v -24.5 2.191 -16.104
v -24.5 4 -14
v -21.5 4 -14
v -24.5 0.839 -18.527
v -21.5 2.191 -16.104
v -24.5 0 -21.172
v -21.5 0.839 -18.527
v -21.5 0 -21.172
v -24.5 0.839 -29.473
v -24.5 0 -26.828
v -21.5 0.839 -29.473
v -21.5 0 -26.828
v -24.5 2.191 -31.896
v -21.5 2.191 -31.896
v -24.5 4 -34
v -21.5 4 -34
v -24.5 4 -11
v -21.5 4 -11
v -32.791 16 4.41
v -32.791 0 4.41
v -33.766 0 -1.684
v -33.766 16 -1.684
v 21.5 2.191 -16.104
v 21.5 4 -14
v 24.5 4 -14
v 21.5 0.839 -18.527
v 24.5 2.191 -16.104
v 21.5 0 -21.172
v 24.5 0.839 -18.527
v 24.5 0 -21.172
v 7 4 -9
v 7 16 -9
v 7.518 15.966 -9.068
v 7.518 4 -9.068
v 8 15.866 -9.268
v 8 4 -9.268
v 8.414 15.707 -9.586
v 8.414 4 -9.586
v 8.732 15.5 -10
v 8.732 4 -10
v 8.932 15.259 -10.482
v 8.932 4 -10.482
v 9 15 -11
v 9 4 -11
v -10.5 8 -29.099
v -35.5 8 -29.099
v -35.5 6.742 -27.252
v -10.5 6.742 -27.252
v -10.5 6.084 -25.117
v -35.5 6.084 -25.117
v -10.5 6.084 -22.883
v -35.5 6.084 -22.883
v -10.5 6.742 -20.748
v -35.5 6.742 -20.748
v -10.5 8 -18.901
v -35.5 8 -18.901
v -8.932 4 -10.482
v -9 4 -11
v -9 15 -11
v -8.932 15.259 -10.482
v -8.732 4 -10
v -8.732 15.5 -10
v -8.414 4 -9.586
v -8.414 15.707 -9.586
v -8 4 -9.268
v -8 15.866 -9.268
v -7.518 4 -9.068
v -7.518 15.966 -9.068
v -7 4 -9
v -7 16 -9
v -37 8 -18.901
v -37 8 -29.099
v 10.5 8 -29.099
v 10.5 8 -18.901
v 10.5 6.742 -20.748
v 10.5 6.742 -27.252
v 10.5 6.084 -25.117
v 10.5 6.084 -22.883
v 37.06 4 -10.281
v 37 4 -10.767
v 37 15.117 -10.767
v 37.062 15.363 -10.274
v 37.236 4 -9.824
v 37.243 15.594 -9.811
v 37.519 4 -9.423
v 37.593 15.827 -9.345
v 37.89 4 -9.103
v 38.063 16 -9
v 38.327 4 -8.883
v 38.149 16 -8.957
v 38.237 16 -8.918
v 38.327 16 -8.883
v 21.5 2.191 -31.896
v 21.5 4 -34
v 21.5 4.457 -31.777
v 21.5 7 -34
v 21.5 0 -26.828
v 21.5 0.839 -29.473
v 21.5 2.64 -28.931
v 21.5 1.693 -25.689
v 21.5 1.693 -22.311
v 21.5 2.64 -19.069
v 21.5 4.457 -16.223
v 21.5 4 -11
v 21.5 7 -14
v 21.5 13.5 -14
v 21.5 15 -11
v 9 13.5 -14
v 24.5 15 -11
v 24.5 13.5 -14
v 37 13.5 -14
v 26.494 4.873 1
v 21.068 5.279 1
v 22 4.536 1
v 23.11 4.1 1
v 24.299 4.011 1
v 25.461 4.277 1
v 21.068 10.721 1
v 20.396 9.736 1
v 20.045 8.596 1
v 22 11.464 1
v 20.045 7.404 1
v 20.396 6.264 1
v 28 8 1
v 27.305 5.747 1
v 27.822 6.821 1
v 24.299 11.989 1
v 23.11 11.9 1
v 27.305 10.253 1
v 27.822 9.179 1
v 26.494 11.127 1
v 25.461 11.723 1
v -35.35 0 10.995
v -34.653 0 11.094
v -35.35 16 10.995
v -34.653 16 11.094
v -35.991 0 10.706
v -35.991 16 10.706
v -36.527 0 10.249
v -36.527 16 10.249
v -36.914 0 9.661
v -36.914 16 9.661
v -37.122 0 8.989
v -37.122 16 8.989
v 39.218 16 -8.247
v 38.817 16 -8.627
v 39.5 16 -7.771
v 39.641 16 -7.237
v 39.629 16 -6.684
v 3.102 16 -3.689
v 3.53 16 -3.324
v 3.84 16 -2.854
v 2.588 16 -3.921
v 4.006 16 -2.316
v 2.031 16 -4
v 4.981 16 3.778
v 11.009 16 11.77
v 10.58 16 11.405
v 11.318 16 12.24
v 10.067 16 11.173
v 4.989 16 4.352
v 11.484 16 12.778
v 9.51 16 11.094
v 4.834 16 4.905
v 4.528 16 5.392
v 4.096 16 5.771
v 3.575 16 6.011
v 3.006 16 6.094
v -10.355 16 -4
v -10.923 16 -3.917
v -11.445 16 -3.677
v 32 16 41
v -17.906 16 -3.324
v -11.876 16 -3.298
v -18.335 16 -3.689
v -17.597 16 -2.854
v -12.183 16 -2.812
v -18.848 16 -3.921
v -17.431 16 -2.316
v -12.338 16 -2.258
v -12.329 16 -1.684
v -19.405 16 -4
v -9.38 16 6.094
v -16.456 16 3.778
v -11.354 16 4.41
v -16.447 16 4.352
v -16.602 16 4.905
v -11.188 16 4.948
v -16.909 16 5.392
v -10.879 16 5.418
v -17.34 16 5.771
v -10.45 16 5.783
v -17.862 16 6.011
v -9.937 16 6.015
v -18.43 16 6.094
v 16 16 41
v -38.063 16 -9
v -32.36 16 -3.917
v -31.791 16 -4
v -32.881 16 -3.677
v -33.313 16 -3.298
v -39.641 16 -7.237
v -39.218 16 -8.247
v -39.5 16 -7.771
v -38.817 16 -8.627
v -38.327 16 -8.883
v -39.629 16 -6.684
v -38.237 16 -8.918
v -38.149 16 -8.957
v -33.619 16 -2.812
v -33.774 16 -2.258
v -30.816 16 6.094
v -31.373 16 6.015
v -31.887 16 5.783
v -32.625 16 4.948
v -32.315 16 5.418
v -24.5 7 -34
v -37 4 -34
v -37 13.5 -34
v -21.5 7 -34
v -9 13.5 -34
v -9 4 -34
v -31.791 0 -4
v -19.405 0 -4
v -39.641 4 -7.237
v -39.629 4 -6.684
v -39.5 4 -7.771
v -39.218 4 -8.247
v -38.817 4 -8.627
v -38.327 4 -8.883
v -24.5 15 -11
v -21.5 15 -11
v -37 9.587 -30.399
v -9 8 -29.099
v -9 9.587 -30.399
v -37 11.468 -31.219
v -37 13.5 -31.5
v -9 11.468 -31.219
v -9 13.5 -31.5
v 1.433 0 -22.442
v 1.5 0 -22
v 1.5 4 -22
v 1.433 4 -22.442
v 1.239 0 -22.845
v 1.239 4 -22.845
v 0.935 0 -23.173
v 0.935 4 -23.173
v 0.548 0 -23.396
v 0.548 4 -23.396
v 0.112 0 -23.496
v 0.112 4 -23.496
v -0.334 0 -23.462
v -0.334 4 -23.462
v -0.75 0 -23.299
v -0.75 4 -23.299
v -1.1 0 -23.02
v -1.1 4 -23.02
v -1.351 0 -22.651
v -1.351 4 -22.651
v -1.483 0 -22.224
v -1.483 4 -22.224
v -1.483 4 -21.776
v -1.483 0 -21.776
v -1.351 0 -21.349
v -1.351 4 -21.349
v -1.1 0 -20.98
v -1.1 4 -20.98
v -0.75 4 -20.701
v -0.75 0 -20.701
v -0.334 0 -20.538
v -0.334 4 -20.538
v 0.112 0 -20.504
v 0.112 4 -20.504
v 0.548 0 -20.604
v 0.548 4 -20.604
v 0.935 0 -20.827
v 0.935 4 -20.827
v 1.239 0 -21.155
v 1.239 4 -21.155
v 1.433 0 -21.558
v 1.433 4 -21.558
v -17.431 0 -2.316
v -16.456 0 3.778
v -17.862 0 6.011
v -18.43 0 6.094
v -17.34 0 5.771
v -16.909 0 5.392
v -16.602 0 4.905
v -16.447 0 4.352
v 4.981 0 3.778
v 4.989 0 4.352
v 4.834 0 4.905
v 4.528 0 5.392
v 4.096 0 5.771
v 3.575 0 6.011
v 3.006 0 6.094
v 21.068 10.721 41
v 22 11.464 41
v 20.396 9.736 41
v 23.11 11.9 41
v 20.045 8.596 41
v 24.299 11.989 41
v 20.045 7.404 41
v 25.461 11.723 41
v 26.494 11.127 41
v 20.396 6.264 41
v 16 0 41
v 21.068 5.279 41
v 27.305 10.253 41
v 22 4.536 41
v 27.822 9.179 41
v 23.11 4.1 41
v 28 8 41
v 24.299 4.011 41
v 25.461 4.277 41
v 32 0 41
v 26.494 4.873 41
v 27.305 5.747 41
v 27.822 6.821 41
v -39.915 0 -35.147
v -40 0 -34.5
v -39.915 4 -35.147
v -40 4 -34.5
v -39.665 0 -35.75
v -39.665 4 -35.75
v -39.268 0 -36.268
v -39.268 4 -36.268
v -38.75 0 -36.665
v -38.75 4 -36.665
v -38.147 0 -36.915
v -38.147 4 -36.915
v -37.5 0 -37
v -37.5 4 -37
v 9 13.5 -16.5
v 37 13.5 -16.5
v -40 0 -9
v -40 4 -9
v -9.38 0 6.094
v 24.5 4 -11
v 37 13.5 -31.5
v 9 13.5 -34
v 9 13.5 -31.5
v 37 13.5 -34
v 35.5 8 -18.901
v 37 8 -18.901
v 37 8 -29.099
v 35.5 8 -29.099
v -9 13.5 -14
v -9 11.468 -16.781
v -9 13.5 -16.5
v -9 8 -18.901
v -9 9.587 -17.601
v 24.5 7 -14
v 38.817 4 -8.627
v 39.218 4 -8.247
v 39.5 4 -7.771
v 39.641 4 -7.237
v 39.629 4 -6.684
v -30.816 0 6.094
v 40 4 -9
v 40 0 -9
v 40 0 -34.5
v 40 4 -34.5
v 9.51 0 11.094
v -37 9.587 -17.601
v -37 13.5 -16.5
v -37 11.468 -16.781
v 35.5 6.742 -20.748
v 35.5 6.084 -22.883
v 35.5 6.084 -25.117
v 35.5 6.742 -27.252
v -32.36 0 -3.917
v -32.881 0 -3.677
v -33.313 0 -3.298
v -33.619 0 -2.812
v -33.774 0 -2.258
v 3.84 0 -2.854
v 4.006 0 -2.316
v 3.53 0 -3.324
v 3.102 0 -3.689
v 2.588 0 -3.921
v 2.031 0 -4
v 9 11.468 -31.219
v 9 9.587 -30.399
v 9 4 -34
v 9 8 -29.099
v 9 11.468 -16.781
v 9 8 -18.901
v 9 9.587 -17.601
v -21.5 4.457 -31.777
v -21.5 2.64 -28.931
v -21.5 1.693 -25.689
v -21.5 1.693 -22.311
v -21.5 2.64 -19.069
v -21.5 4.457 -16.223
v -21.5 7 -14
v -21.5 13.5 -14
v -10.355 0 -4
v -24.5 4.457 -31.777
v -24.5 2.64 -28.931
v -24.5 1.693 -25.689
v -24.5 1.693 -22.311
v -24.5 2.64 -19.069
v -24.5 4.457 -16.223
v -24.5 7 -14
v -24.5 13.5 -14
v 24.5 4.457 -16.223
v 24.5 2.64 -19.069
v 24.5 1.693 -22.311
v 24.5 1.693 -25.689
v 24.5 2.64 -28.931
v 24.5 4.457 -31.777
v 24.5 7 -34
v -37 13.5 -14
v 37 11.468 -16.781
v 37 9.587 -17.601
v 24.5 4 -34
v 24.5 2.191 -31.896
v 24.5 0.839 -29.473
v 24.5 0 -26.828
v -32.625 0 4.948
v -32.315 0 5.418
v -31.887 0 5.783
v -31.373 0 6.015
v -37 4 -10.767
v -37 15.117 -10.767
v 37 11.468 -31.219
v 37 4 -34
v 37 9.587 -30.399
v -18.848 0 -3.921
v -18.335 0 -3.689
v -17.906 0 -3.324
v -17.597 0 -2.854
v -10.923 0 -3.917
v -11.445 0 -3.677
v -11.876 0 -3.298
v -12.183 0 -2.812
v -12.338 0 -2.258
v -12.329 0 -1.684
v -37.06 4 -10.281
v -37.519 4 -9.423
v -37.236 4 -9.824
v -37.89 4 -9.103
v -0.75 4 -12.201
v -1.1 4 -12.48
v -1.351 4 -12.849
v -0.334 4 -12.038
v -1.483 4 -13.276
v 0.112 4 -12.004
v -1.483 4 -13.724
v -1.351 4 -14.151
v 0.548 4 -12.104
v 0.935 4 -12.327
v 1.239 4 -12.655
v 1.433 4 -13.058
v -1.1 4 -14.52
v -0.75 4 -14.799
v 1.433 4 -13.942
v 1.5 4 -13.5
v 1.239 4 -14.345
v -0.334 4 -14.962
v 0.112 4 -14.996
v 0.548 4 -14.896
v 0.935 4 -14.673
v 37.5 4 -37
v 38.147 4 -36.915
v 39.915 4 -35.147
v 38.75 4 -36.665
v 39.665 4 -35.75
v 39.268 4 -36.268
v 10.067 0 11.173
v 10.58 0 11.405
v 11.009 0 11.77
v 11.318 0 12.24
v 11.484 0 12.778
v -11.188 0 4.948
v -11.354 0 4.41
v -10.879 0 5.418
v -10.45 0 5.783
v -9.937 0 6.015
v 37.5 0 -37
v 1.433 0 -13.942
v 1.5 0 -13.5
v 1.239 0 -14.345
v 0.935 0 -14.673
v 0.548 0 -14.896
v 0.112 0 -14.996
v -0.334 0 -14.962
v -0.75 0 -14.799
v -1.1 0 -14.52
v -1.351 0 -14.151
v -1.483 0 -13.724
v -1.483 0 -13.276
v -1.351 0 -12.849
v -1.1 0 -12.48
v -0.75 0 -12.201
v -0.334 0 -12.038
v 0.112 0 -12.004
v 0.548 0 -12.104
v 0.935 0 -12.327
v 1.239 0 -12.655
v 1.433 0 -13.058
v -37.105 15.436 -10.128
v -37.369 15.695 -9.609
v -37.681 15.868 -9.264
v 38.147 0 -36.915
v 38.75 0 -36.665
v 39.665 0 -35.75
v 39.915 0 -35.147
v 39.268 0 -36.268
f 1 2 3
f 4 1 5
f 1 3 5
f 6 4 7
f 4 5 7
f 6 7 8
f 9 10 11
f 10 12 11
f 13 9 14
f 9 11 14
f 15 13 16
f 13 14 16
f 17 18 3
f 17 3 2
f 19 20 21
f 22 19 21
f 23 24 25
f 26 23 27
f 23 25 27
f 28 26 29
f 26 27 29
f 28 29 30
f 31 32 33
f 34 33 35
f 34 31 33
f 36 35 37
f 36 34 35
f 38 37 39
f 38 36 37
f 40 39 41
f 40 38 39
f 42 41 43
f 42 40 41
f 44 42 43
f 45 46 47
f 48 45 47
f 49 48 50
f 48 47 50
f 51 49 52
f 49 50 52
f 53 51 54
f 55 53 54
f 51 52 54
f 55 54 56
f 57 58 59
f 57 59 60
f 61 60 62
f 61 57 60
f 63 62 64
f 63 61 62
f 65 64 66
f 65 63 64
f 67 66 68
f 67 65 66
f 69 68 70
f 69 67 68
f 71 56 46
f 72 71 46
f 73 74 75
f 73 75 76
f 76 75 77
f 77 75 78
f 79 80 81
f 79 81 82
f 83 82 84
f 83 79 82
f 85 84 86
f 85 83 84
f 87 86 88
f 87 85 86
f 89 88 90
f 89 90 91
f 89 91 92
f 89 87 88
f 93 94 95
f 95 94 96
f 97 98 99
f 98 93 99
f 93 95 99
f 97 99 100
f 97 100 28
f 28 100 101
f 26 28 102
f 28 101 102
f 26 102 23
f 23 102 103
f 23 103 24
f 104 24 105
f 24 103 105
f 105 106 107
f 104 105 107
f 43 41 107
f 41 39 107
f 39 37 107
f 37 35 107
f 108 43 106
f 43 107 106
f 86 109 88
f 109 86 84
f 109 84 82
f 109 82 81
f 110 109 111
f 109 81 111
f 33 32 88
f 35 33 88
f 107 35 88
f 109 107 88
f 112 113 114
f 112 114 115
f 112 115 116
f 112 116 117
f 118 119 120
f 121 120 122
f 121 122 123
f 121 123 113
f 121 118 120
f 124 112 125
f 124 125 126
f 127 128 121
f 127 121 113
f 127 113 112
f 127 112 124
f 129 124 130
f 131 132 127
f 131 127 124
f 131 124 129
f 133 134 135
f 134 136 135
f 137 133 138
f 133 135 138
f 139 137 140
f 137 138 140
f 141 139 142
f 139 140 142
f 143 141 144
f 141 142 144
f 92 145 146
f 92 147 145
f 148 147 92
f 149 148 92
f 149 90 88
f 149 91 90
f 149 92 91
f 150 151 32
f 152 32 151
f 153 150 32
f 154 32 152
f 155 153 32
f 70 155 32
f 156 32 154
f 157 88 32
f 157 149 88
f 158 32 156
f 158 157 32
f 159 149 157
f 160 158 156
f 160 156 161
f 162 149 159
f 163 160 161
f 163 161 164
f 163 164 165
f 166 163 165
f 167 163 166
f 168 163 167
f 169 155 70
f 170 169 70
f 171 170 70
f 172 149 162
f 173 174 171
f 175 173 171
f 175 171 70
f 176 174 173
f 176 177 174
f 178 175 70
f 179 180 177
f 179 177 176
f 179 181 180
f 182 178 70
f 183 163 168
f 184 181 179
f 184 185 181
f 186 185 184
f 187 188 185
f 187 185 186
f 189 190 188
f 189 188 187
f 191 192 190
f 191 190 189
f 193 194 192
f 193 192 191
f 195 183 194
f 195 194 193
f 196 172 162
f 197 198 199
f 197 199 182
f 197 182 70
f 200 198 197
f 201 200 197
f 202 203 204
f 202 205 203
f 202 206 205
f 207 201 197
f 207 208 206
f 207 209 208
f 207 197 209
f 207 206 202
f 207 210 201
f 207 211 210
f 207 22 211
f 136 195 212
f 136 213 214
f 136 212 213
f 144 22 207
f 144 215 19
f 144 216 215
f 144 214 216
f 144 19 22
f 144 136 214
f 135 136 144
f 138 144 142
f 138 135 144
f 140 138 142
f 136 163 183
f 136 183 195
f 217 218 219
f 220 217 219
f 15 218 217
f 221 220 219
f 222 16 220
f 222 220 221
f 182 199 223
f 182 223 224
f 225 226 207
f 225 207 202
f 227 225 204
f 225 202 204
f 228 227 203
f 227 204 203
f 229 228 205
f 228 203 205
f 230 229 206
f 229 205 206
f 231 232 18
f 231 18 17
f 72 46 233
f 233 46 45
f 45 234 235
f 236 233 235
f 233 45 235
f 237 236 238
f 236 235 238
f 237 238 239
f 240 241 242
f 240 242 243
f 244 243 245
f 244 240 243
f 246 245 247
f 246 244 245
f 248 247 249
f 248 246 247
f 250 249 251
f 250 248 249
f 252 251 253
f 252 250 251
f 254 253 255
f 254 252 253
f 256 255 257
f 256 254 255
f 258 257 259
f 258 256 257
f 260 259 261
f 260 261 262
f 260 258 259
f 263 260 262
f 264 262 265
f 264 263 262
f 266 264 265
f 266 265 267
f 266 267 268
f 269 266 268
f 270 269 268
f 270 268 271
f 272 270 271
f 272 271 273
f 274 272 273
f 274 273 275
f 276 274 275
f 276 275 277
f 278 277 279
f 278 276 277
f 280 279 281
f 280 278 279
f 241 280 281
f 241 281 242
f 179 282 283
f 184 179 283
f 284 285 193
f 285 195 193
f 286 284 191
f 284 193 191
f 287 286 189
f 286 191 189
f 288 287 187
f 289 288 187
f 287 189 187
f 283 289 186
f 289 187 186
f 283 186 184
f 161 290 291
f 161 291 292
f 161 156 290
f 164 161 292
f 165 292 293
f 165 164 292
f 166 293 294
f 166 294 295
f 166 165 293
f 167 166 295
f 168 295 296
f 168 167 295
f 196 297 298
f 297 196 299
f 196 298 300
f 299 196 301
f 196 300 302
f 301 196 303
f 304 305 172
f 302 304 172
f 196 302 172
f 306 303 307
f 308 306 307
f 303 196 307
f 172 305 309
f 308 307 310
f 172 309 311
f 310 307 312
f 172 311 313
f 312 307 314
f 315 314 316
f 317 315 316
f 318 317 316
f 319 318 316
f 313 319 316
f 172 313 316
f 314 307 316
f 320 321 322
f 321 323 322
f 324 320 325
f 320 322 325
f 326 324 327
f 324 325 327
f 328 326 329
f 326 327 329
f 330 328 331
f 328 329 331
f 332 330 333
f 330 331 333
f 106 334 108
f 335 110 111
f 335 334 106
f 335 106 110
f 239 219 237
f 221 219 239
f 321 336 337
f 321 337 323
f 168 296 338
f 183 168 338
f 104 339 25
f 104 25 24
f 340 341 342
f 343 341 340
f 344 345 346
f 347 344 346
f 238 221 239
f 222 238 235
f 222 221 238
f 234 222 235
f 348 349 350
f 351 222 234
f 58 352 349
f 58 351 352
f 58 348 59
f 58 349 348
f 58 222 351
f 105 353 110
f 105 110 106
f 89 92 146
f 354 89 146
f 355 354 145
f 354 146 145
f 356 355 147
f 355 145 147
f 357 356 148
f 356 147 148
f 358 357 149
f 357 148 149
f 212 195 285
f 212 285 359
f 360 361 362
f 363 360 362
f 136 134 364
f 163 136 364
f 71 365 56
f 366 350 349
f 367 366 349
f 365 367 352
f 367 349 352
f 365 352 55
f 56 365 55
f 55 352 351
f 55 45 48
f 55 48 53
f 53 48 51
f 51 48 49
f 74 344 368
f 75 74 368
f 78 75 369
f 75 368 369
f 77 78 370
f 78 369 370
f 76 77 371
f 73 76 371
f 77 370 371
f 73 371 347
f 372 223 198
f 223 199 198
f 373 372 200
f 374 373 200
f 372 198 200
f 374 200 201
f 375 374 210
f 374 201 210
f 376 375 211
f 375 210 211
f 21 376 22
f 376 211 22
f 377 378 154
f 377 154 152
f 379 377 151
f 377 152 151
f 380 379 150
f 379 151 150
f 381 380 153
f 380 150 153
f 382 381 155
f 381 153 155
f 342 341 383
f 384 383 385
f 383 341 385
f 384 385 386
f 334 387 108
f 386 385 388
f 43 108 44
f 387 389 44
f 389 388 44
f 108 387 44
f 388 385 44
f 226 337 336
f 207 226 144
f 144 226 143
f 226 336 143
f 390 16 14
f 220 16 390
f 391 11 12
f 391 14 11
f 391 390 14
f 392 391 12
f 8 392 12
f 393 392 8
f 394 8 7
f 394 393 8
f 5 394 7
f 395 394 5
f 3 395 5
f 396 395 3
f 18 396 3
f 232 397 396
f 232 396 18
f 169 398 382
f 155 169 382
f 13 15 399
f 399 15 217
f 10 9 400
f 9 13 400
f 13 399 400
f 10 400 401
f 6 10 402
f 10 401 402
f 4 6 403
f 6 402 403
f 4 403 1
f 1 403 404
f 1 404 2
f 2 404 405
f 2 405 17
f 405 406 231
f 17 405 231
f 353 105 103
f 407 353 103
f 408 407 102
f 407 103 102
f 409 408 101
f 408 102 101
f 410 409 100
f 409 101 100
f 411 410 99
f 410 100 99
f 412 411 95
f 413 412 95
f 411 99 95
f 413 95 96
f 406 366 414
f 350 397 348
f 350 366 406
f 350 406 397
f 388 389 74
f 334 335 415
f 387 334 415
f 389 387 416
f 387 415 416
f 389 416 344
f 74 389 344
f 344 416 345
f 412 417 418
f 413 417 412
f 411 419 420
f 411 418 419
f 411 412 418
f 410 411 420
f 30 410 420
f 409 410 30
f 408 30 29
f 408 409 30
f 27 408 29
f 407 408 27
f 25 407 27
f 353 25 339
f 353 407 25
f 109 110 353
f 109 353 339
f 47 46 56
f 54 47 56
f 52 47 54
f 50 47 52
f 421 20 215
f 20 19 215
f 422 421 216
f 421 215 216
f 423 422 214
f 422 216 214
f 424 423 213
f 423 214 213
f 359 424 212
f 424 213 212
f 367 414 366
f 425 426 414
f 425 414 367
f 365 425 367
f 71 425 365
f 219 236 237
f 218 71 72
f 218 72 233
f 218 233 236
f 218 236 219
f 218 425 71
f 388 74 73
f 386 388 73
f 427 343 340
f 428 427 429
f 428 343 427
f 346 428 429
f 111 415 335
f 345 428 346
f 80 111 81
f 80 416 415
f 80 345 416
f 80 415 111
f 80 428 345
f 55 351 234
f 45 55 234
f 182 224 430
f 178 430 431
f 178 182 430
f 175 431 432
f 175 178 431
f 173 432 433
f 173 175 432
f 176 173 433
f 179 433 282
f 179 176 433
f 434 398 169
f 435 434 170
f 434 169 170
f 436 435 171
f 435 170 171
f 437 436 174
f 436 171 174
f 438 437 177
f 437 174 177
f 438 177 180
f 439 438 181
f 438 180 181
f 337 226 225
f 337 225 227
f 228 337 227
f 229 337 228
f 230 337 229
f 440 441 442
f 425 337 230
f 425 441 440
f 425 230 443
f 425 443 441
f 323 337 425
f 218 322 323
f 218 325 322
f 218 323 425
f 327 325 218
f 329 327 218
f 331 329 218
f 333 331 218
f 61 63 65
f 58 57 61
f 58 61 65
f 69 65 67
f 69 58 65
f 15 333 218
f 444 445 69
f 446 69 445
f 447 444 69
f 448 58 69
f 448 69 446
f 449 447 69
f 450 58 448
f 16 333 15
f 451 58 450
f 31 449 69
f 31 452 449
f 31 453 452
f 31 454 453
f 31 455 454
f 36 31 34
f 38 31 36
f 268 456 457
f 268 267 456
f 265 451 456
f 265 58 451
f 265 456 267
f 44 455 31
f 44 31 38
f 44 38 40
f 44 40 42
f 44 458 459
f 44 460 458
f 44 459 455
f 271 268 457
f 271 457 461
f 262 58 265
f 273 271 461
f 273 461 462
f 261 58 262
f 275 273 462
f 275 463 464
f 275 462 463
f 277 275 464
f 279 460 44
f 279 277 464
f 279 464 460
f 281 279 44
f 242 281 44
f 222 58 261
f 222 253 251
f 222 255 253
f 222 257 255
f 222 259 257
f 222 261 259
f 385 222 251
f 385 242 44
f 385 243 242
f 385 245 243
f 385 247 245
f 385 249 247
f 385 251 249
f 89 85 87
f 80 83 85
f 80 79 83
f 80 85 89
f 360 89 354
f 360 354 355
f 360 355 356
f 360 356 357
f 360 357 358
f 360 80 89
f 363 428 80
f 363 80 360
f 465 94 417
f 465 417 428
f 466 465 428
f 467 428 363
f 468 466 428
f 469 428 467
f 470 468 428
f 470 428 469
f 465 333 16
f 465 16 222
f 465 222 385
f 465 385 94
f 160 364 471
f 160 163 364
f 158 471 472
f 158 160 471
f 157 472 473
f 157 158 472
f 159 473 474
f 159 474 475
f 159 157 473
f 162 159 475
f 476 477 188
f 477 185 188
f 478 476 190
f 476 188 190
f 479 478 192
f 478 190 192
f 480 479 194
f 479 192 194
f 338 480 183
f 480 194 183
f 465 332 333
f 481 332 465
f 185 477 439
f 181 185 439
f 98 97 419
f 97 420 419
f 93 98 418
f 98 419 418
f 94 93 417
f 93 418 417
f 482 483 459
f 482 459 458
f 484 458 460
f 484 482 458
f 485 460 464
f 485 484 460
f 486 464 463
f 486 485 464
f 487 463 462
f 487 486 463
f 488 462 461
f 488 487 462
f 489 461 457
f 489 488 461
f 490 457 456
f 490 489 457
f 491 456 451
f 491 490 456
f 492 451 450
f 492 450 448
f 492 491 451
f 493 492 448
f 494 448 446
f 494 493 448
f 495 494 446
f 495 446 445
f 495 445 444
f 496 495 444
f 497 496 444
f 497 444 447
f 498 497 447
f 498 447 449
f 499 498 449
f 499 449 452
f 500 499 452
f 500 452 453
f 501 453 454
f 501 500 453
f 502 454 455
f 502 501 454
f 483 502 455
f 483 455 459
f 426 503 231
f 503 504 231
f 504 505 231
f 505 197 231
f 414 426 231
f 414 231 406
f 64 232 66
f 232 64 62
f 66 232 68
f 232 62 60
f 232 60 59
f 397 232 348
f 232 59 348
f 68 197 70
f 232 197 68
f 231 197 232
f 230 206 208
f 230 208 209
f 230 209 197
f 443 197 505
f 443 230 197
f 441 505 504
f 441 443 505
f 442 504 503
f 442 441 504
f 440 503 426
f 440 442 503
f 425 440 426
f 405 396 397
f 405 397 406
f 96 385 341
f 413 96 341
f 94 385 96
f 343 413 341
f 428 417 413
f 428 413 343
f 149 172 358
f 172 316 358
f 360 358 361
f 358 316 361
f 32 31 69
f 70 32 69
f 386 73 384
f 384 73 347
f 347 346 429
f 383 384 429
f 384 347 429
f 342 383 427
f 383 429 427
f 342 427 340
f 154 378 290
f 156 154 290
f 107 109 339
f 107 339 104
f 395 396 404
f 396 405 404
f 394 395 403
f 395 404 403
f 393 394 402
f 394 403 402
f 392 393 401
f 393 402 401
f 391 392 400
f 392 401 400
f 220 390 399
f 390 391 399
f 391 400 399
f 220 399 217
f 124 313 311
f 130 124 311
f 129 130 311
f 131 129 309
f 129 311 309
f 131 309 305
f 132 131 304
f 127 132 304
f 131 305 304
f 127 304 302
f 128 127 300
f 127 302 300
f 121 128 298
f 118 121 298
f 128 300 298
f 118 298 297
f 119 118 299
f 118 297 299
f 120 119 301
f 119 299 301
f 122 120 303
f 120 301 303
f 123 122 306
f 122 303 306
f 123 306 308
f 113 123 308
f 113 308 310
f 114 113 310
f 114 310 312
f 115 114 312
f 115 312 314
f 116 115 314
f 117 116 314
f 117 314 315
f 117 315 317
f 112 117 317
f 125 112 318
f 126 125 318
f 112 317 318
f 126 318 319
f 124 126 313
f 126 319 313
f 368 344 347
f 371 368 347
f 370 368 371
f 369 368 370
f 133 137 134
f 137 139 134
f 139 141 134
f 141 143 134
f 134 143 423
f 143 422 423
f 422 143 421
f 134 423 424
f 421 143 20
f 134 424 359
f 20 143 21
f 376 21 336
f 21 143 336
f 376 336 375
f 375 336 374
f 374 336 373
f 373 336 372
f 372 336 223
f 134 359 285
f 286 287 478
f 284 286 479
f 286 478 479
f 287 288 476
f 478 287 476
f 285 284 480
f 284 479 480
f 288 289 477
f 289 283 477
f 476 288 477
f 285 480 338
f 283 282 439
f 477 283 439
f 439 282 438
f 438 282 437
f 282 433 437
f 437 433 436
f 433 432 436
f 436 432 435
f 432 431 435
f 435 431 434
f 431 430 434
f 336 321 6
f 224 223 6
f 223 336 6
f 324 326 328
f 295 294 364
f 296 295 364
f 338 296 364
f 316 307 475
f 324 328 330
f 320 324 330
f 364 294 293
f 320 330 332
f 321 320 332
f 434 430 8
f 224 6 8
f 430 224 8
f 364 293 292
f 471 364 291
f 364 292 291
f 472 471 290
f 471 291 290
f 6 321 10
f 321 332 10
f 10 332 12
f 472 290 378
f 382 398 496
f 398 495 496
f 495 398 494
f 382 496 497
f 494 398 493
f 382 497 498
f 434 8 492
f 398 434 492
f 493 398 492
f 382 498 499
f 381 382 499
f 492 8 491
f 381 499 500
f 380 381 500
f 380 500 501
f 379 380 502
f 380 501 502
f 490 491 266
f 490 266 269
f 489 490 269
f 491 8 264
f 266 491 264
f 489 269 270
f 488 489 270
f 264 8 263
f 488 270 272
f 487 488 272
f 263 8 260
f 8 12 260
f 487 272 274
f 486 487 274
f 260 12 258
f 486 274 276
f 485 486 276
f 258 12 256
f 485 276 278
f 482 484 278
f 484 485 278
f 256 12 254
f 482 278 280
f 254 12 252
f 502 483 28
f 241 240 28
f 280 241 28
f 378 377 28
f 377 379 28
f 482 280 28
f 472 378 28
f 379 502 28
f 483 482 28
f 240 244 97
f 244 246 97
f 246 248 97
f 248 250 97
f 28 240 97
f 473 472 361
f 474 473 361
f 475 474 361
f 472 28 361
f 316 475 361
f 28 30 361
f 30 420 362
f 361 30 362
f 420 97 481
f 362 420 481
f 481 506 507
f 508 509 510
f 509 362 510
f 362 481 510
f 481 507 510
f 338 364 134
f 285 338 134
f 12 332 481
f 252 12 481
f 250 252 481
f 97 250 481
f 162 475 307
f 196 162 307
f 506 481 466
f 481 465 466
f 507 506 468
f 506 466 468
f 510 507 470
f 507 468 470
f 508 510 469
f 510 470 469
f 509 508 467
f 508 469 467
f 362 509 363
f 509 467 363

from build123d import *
from build123d.topology import SkipClean

# Parameters (mm, degrees)
SKETCH7_W           = 80
SKETCH7_H           = 28
EXTRUDE2_DEPTH      = 4
SKETCH8_W           = 28
SKETCH8_H           = 20
EXTRUDE3_DEPTH      = 9.5
EXTRUDE6_DEPTH      = 28
SKETCH15_R          = 7.5
EXTRUDE7_DEPTH      = 25
SKETCH16_W          = 3
SKETCH16_H          = 3
SKETCH8_4_W         = 28
SKETCH8_4_H         = 20
EXTRUDE8_DEPTH      = 9.5
EXTRUDE9_DEPTH      = 28
SKETCH19_R          = 7.5
EXTRUDE10_DEPTH     = 25
SKETCH20_W          = 3
SKETCH20_H          = 3
FILLET1_R           = 2.5
EXTRUDE11_DEPTH     = 16
SKETCH23_R          = 4
EXTRUDE12_DEPTH     = 40
SKETCH25_W          = 28
SKETCH25_H          = 5
EXTRUDE13_DEPTH     = 12
EXTRUDE14_REACH     = 90.69
FILLET2_R           = 2.5
FILLET9_R           = 2
FILLET10_R          = 2
FILLET11_R          = 2
SKETCH27_W          = 28
SKETCH27_H          = 5
EXTRUDE15_DEPTH     = 12
EXTRUDE16_REACH     = 90.69
FILLET12_R          = 2
FILLET13_R          = 2
FILLET14_R          = 2
FILLET15_R          = 2
SKETCH30_W          = 3
SKETCH30_H          = 3
EXTRUDE17_DEPTH     = 12
SKETCH31_W          = 3
SKETCH31_H          = 3
EXTRUDE18_DEPTH     = 12
FILLET16_R          = 2
EXTRUDE19_OUTLINE_R = 1.5
EXTRUDE19_DEPTH     = 4


# Read off the part's stored shape, not the designer's step: Extrude19
with BuildPart() as part:
    # Sketch7 → Extrude2 (new body)
    with BuildSketch(Plane(origin=(0, 0, 0), x_dir=(1, 0, 0), z_dir=(0, 1, 0))):
        with Locations((0, 23)):
            Rectangle(SKETCH7_W, SKETCH7_H)
    extrude(amount=EXTRUDE2_DEPTH)


with BuildPart() as body_2:
    # Sketch8 → Extrude3 (new body)
    with BuildSketch(Plane(origin=(0, 4, 0), x_dir=(1, 0, 0), z_dir=(0, 1, 0))):
        with Locations((-23, 24)):
            Rectangle(SKETCH8_W, SKETCH8_H)
    extrude(amount=EXTRUDE3_DEPTH)

    # Sketch10 → Extrude6 (cut)
    with BuildSketch(Plane(origin=(-9, 0, 0), x_dir=(0, 0, -1), z_dir=(1, 0, 0))):
        with BuildLine():
            Line((31.5, 13.5), (24, 13.5))
            Line((24, 13.5), (16.5, 13.5))
            ThreePointArc((16.5, 13.5), (17.126403912, 10.499387259), (18.900980486, 8))
            Line((18.900980486, 8), (29.099019514, 8))
            ThreePointArc((29.099019514, 8), (30.873596088, 10.499387259), (31.5, 13.5))
        make_face()
    extrude(amount=-EXTRUDE6_DEPTH, mode=Mode.SUBTRACT)

    # Sketch15 → Extrude7 (cut)
    with SkipClean():  # the faces are left unmerged after this step: merging them gives an invalid solid
        with BuildSketch(Plane.ZY.offset(35.5)):
            with Locations((-24, 13.5)):
                Circle(SKETCH15_R)
        extrude(amount=-EXTRUDE7_DEPTH, mode=Mode.SUBTRACT)


with BuildPart() as cut_sweep1_tool:
    # Cut-Sweep1: sweep along a path in Sketch17
    with SkipClean():  # the faces are left unmerged after this step: merging them gives an invalid solid
        with BuildLine(Plane(origin=(-23, 0, 0), x_dir=(0, 0, -1), z_dir=(1, 0, 0))) as cut_sweep1_path:
            CenterArc((24, 13.5), 12.806248475, 0, 360)
        # Sketch16 → Cut-Sweep1 (sweep)
        with BuildSketch(Plane.XY.offset(-14)):
            with Locations((-23, 5.5)):
                Rectangle(SKETCH16_W, SKETCH16_H)
        sweep(path=cut_sweep1_path.line)


with BuildPart() as part_1:
    with SkipClean():  # the faces are left unmerged after this step: merging them gives an invalid solid
        add(part.part)

        # Cut-Sweep1: cut by cut_sweep1_tool
        add(cut_sweep1_tool.part, mode=Mode.SUBTRACT)

    # Sketch8<4> → Extrude8 (add)
    with BuildSketch(Plane(origin=(0, 4, 0), x_dir=(1, 0, 0), z_dir=(0, 1, 0))):
        with Locations((23, 24)):
            Rectangle(SKETCH8_4_W, SKETCH8_4_H)
    extrude(amount=EXTRUDE8_DEPTH)

    # Sketch18 → Extrude9 (cut)
    with BuildSketch(Plane(origin=(37, 0, 0), x_dir=(0, 0, -1), z_dir=(1, 0, 0))):
        with BuildLine():
            Line((18.900980486, 8), (29.099019514, 8))
            ThreePointArc((29.099019514, 8), (30.873596088, 10.499387259), (31.5, 13.5))
            Line((31.5, 13.5), (16.5, 13.5))
            ThreePointArc((16.5, 13.5), (17.126403912, 10.499387259), (18.900980486, 8))
        make_face()
    extrude(amount=-EXTRUDE9_DEPTH, mode=Mode.SUBTRACT)

    # Sketch19 → Extrude10 (cut)
    with BuildSketch(Plane(origin=(35.5, 0, 0), x_dir=(0, 0, -1), z_dir=(1, 0, 0))):
        with Locations((24, 13.5)):
            Circle(SKETCH19_R)
    extrude(amount=-EXTRUDE10_DEPTH, mode=Mode.SUBTRACT)

    # Cut-Sweep2: sweep along a path in Sketch21
    with BuildLine(Plane(origin=(23, 0, 0), x_dir=(0, 0, -1), z_dir=(1, 0, 0))) as cut_sweep2_path:
        CenterArc((24, 13.5), 12.806248475, 0, 360)
    # Sketch20 → Cut-Sweep2 (sweep, cut)
    with BuildSketch(Plane.XY.offset(-14)):
        with Locations((23, 5.5)):
            Rectangle(SKETCH20_W, SKETCH20_H)
    sweep(path=cut_sweep2_path.line, mode=Mode.SUBTRACT)

    # Fillet1
    fillet1_edges = [part_1.edges().sort_by_distance(p)[0] for p in [
        (-40, 2, -37),
        (40, 2, -37),
    ]]
    fillet(fillet1_edges, radius=FILLET1_R)

    # Sketch22 → Extrude11 (add)
    with BuildSketch(Plane(origin=(0, 0, 0), x_dir=(1, 0, 0), z_dir=(0, 1, 0))):
        Polygon((11.215030697, -11.093941854), (16, -41), (32, -41), (40, 9), (-40, 9), (-36.784969303, -11.093941854), align=None)
        Polygon((3.73640444, 4), (5.351435136, -6.093941854), (-11.084969303, -6.093941854), (-12.7, 4), align=None, mode=Mode.SUBTRACT)
        Polygon((-16.084969303, -6.093941854), (-32.521373743, -6.093941854), (-34.13640444, 4), (-17.7, 4), align=None, mode=Mode.SUBTRACT)
    extrude(amount=EXTRUDE11_DEPTH)

    # Sketch23 → Extrude12 (cut)
    with BuildSketch(Plane.XY.offset(41)):
        with Locations((24, 8)):
            Circle(SKETCH23_R)
    extrude(amount=-EXTRUDE12_DEPTH, mode=Mode.SUBTRACT)



with BuildPart() as body_2_1:
    with SkipClean():  # the faces are left unmerged after this step: merging them gives an invalid solid
        add(body_2.part)

        # Cut-Sweep1: cut by cut_sweep1_tool
        add(cut_sweep1_tool.part, mode=Mode.SUBTRACT)


with BuildPart() as part_2:
    with SkipClean():  # the faces are left unmerged after this step: merging them gives an invalid solid
        add(part_1.part)

        add(body_2_1.part)  # Extrude13 merges body 2
        # Sketch25 → Extrude13 (add)
        with BuildSketch(Plane(origin=(0, 4, 0), x_dir=(-1, 0, 0), z_dir=(0, 1, 0))):
            with Locations((23, -11.5)):
                Rectangle(SKETCH25_W, SKETCH25_H)
        extrude(amount=EXTRUDE13_DEPTH)

    # Sketch26 → Extrude14 (cut, up to next)
    with BuildSketch(Plane.ZY.offset(37), mode=Mode.PRIVATE) as extrude14_sk1:
        Polygon((-14, 13.5), (-9, 16), (-14, 16), align=None)
    extrude14_tool1 = extrude(extrude14_sk1.sketch, amount=-EXTRUDE14_REACH, mode=Mode.PRIVATE) & part_2.part
    add(extrude14_tool1.solids().sort_by_distance((-37, 15.166667, -12.333333))[0], mode=Mode.SUBTRACT)

    # Fillet2
    fillet2_edges = [part_2.edges().sort_by_distance(p)[0] for p in [
        (-36.784969303, 8, 11.093941854),
    ]]
    fillet(fillet2_edges, radius=FILLET2_R)

    # Fillet9
    fillet9_edges = [part_2.edges().sort_by_distance(p)[0] for p in [
        (-40, 10, -9),
    ]]
    fillet(fillet9_edges, radius=FILLET9_R)

    # Fillet10
    # the kernel refuses this fillet: 2 mm, written as the material it adds along each edge
    with BuildSketch(Plane(origin=(-37, 4, -9), x_dir=(0, 0, -1), z_dir=(0, 1, 0))) as fillet10_piece_1_section:
        with BuildLine():
            CenterArc((1.766934561, 2), FILLET10_R, 199.655233066, 70.344766934)
            Line((-0.11653272, 1.327280888), (-0.304879448, 1.260008977))
            ThreePointArc((-0.304879448, 1.260008977), (-0.2, 0.654561776), (-0.2, 0))
            Line((-0.2, 0), (0, -0.2))
            Line((0, -0.2), (1.766934561, -0.2))
            Line((1.766934561, -0.2), (1.766934561, 0))
        make_face()
    fillet10_piece_1 = extrude(amount=12, mode=Mode.PRIVATE)
    fillet10_piece_1 = split(fillet10_piece_1, bisect_by=Plane(origin=(-37.361885023, 14.554978546, -11.890042908), z_dir=(0, -0.8944271909999159, 0.44721359549995804)), keep=Keep.TOP, mode=Mode.PRIVATE)
    add(fillet10_piece_1)

    # Fillet11
    # the kernel refuses this fillet: 2 mm, written as the material it adds along each edge
    with BuildSketch(Plane(origin=(-9, 4, -9), x_dir=(1, 0, 0), z_dir=(0, 1, 0))) as fillet11_piece_1_section:
        with BuildLine():
            CenterArc((FILLET11_R, FILLET11_R), FILLET11_R, 180, 90)
            Line((0, FILLET11_R), (0, 0))
            Line((0, 0), (FILLET11_R, 0))
        make_face()
    fillet11_piece_1 = extrude(amount=17, mode=Mode.PRIVATE)
    fillet11_piece_1 = split(fillet11_piece_1, bisect_by=Plane(origin=(-8.54975152, 14.60165577, -11.796688461), z_dir=(0, -0.894427190999916, 0.447213595499958)), keep=Keep.TOP, mode=Mode.PRIVATE)
    add(fillet11_piece_1)

    # Sketch27 → Extrude15 (add)
    with BuildSketch(Plane(origin=(0, 4, 0), x_dir=(-1, 0, 0), z_dir=(0, 1, 0))):
        with Locations((-23, -11.5)):
            Rectangle(SKETCH27_W, SKETCH27_H)
    extrude(amount=EXTRUDE15_DEPTH)

    # Sketch28 → Extrude16 (cut, up to next)
    with BuildSketch(Plane(origin=(37, 0, 0), x_dir=(0, 0, -1), z_dir=(1, 0, 0)), mode=Mode.PRIVATE) as extrude16_sk1:
        Polygon((14, 13.5), (9, 16), (14, 16), align=None)
    extrude16_tool1 = extrude(extrude16_sk1.sketch, amount=-EXTRUDE16_REACH, mode=Mode.PRIVATE) & part_2.part
    add(extrude16_tool1.solids().sort_by_distance((37, 15.166667, -12.333333))[0], mode=Mode.SUBTRACT)

    # Fillet12
    fillet12_edges = [part_2.edges().sort_by_distance(p)[0] for p in [
        (40, 10, -9),
    ]]
    fillet(fillet12_edges, radius=FILLET12_R)

    # Fillet13
    # the kernel refuses this fillet: 2 mm, written as the material it adds along each edge
    with BuildSketch(Plane(origin=(37, -0.417336402, -9), x_dir=(0.9961678888786428, 0, 0.08746163254289291), z_dir=(0, 1, 0))) as fillet13_piece_1_section:
        with BuildLine():
            CenterArc((1.837796796, 1.935086736), FILLET13_R, 185.017593378, 70.344766934)
            Line((-0.154538981, 1.760163471), (-0.353772559, 1.742671145))
            Line((-0.353772559, 1.742671145), (-0.199233578, -0.017492327))
            Line((-0.199233578, -0.017492327), (0.017492327, -0.199233578))
            ThreePointArc((0.017492327, -0.199233578), (0.669545749, -0.141984536), (1.281845737, -0.193508674))
            Line((1.281845737, -0.193508674), (1.332386742, 0))
        make_face()
    fillet13_piece_1 = extrude(amount=16.417336402, mode=Mode.PRIVATE)
    fillet13_piece_1 = split(fillet13_piece_1, bisect_by=Plane(origin=(37.361885023, 14.554978546, -11.890042908), z_dir=(0, -0.8944271909999157, 0.4472135954999582)), keep=Keep.TOP, mode=Mode.PRIVATE)
    fillet13_piece_1 = split(fillet13_piece_1, bisect_by=Plane(origin=(37.361885023, 0, -9.612553635), z_dir=(0, 1, 0)), keep=Keep.TOP, mode=Mode.PRIVATE)
    add(fillet13_piece_1)

    # Fillet14
    # the kernel refuses this fillet: 2 mm, written as the material it adds along each edge
    with BuildSketch(Plane(origin=(9, 4, -9), x_dir=(0, 0, -1), z_dir=(0, 1, 0))) as fillet14_piece_1_section:
        with BuildLine():
            CenterArc((FILLET14_R, FILLET14_R), FILLET14_R, 180, 90)
            Line((0, FILLET14_R), (0, 0))
            Line((0, 0), (FILLET14_R, 0))
        make_face()
    fillet14_piece_1 = extrude(amount=17, mode=Mode.PRIVATE)
    fillet14_piece_1 = split(fillet14_piece_1, bisect_by=Plane(origin=(8.54975152, 14.60165577, -11.796688461), z_dir=(0, -0.894427190999916, 0.447213595499958)), keep=Keep.TOP, mode=Mode.PRIVATE)
    add(fillet14_piece_1)

    # Fillet15
    fillet15_edges = [part_2.edges().sort_by_distance(p)[0] for p in [
        (-12.7, 8, -4),
        (-11.084969303, 8, 6.093941854),
        (5.351435136, 8, 6.093941854),
        (3.73640444, 8, -4),
        (-17.7, 8, -4),
        (-34.13640444, 8, -4),
        (-32.521373743, 8, 6.093941854),
        (-16.084969303, 8, 6.093941854),
    ]]
    fillet(fillet15_edges, radius=FILLET15_R)

    # Sketch30 → Extrude17 (cut)
    with BuildSketch(Plane(origin=(0, 16, 0), x_dir=(-1, 0, 0), z_dir=(0, 1, 0))):
        with Locations((-23, -12.5)):
            Rectangle(SKETCH30_W, SKETCH30_H)
    extrude(amount=-EXTRUDE17_DEPTH, mode=Mode.SUBTRACT)

    # Sketch31 → Extrude18 (cut)
    with BuildSketch(Plane(origin=(0, 16, 0), x_dir=(-1, 0, 0), z_dir=(0, 1, 0))):
        with Locations((23, -12.5)):
            Rectangle(SKETCH31_W, SKETCH31_H)
    extrude(amount=-EXTRUDE18_DEPTH, mode=Mode.SUBTRACT)

    # Fillet16
    fillet16_edges = [part_2.edges().sort_by_distance(p)[0] for p in [
        (11.215030697, 8, 11.093941854),
    ]]
    fillet(fillet16_edges, radius=FILLET16_R)

    # Extrude19 outline → Extrude19 (cut)
    with BuildSketch(Plane(origin=(0, 0, 0), x_dir=(1, 0, 0), z_dir=(0, 1, 0))):
        with Locations((0, 22)):
            Circle(EXTRUDE19_OUTLINE_R)
        with Locations((0, 13.5)):
            Circle(EXTRUDE19_OUTLINE_R)
    extrude(amount=EXTRUDE19_DEPTH, mode=Mode.SUBTRACT)


solid = part_2.part
